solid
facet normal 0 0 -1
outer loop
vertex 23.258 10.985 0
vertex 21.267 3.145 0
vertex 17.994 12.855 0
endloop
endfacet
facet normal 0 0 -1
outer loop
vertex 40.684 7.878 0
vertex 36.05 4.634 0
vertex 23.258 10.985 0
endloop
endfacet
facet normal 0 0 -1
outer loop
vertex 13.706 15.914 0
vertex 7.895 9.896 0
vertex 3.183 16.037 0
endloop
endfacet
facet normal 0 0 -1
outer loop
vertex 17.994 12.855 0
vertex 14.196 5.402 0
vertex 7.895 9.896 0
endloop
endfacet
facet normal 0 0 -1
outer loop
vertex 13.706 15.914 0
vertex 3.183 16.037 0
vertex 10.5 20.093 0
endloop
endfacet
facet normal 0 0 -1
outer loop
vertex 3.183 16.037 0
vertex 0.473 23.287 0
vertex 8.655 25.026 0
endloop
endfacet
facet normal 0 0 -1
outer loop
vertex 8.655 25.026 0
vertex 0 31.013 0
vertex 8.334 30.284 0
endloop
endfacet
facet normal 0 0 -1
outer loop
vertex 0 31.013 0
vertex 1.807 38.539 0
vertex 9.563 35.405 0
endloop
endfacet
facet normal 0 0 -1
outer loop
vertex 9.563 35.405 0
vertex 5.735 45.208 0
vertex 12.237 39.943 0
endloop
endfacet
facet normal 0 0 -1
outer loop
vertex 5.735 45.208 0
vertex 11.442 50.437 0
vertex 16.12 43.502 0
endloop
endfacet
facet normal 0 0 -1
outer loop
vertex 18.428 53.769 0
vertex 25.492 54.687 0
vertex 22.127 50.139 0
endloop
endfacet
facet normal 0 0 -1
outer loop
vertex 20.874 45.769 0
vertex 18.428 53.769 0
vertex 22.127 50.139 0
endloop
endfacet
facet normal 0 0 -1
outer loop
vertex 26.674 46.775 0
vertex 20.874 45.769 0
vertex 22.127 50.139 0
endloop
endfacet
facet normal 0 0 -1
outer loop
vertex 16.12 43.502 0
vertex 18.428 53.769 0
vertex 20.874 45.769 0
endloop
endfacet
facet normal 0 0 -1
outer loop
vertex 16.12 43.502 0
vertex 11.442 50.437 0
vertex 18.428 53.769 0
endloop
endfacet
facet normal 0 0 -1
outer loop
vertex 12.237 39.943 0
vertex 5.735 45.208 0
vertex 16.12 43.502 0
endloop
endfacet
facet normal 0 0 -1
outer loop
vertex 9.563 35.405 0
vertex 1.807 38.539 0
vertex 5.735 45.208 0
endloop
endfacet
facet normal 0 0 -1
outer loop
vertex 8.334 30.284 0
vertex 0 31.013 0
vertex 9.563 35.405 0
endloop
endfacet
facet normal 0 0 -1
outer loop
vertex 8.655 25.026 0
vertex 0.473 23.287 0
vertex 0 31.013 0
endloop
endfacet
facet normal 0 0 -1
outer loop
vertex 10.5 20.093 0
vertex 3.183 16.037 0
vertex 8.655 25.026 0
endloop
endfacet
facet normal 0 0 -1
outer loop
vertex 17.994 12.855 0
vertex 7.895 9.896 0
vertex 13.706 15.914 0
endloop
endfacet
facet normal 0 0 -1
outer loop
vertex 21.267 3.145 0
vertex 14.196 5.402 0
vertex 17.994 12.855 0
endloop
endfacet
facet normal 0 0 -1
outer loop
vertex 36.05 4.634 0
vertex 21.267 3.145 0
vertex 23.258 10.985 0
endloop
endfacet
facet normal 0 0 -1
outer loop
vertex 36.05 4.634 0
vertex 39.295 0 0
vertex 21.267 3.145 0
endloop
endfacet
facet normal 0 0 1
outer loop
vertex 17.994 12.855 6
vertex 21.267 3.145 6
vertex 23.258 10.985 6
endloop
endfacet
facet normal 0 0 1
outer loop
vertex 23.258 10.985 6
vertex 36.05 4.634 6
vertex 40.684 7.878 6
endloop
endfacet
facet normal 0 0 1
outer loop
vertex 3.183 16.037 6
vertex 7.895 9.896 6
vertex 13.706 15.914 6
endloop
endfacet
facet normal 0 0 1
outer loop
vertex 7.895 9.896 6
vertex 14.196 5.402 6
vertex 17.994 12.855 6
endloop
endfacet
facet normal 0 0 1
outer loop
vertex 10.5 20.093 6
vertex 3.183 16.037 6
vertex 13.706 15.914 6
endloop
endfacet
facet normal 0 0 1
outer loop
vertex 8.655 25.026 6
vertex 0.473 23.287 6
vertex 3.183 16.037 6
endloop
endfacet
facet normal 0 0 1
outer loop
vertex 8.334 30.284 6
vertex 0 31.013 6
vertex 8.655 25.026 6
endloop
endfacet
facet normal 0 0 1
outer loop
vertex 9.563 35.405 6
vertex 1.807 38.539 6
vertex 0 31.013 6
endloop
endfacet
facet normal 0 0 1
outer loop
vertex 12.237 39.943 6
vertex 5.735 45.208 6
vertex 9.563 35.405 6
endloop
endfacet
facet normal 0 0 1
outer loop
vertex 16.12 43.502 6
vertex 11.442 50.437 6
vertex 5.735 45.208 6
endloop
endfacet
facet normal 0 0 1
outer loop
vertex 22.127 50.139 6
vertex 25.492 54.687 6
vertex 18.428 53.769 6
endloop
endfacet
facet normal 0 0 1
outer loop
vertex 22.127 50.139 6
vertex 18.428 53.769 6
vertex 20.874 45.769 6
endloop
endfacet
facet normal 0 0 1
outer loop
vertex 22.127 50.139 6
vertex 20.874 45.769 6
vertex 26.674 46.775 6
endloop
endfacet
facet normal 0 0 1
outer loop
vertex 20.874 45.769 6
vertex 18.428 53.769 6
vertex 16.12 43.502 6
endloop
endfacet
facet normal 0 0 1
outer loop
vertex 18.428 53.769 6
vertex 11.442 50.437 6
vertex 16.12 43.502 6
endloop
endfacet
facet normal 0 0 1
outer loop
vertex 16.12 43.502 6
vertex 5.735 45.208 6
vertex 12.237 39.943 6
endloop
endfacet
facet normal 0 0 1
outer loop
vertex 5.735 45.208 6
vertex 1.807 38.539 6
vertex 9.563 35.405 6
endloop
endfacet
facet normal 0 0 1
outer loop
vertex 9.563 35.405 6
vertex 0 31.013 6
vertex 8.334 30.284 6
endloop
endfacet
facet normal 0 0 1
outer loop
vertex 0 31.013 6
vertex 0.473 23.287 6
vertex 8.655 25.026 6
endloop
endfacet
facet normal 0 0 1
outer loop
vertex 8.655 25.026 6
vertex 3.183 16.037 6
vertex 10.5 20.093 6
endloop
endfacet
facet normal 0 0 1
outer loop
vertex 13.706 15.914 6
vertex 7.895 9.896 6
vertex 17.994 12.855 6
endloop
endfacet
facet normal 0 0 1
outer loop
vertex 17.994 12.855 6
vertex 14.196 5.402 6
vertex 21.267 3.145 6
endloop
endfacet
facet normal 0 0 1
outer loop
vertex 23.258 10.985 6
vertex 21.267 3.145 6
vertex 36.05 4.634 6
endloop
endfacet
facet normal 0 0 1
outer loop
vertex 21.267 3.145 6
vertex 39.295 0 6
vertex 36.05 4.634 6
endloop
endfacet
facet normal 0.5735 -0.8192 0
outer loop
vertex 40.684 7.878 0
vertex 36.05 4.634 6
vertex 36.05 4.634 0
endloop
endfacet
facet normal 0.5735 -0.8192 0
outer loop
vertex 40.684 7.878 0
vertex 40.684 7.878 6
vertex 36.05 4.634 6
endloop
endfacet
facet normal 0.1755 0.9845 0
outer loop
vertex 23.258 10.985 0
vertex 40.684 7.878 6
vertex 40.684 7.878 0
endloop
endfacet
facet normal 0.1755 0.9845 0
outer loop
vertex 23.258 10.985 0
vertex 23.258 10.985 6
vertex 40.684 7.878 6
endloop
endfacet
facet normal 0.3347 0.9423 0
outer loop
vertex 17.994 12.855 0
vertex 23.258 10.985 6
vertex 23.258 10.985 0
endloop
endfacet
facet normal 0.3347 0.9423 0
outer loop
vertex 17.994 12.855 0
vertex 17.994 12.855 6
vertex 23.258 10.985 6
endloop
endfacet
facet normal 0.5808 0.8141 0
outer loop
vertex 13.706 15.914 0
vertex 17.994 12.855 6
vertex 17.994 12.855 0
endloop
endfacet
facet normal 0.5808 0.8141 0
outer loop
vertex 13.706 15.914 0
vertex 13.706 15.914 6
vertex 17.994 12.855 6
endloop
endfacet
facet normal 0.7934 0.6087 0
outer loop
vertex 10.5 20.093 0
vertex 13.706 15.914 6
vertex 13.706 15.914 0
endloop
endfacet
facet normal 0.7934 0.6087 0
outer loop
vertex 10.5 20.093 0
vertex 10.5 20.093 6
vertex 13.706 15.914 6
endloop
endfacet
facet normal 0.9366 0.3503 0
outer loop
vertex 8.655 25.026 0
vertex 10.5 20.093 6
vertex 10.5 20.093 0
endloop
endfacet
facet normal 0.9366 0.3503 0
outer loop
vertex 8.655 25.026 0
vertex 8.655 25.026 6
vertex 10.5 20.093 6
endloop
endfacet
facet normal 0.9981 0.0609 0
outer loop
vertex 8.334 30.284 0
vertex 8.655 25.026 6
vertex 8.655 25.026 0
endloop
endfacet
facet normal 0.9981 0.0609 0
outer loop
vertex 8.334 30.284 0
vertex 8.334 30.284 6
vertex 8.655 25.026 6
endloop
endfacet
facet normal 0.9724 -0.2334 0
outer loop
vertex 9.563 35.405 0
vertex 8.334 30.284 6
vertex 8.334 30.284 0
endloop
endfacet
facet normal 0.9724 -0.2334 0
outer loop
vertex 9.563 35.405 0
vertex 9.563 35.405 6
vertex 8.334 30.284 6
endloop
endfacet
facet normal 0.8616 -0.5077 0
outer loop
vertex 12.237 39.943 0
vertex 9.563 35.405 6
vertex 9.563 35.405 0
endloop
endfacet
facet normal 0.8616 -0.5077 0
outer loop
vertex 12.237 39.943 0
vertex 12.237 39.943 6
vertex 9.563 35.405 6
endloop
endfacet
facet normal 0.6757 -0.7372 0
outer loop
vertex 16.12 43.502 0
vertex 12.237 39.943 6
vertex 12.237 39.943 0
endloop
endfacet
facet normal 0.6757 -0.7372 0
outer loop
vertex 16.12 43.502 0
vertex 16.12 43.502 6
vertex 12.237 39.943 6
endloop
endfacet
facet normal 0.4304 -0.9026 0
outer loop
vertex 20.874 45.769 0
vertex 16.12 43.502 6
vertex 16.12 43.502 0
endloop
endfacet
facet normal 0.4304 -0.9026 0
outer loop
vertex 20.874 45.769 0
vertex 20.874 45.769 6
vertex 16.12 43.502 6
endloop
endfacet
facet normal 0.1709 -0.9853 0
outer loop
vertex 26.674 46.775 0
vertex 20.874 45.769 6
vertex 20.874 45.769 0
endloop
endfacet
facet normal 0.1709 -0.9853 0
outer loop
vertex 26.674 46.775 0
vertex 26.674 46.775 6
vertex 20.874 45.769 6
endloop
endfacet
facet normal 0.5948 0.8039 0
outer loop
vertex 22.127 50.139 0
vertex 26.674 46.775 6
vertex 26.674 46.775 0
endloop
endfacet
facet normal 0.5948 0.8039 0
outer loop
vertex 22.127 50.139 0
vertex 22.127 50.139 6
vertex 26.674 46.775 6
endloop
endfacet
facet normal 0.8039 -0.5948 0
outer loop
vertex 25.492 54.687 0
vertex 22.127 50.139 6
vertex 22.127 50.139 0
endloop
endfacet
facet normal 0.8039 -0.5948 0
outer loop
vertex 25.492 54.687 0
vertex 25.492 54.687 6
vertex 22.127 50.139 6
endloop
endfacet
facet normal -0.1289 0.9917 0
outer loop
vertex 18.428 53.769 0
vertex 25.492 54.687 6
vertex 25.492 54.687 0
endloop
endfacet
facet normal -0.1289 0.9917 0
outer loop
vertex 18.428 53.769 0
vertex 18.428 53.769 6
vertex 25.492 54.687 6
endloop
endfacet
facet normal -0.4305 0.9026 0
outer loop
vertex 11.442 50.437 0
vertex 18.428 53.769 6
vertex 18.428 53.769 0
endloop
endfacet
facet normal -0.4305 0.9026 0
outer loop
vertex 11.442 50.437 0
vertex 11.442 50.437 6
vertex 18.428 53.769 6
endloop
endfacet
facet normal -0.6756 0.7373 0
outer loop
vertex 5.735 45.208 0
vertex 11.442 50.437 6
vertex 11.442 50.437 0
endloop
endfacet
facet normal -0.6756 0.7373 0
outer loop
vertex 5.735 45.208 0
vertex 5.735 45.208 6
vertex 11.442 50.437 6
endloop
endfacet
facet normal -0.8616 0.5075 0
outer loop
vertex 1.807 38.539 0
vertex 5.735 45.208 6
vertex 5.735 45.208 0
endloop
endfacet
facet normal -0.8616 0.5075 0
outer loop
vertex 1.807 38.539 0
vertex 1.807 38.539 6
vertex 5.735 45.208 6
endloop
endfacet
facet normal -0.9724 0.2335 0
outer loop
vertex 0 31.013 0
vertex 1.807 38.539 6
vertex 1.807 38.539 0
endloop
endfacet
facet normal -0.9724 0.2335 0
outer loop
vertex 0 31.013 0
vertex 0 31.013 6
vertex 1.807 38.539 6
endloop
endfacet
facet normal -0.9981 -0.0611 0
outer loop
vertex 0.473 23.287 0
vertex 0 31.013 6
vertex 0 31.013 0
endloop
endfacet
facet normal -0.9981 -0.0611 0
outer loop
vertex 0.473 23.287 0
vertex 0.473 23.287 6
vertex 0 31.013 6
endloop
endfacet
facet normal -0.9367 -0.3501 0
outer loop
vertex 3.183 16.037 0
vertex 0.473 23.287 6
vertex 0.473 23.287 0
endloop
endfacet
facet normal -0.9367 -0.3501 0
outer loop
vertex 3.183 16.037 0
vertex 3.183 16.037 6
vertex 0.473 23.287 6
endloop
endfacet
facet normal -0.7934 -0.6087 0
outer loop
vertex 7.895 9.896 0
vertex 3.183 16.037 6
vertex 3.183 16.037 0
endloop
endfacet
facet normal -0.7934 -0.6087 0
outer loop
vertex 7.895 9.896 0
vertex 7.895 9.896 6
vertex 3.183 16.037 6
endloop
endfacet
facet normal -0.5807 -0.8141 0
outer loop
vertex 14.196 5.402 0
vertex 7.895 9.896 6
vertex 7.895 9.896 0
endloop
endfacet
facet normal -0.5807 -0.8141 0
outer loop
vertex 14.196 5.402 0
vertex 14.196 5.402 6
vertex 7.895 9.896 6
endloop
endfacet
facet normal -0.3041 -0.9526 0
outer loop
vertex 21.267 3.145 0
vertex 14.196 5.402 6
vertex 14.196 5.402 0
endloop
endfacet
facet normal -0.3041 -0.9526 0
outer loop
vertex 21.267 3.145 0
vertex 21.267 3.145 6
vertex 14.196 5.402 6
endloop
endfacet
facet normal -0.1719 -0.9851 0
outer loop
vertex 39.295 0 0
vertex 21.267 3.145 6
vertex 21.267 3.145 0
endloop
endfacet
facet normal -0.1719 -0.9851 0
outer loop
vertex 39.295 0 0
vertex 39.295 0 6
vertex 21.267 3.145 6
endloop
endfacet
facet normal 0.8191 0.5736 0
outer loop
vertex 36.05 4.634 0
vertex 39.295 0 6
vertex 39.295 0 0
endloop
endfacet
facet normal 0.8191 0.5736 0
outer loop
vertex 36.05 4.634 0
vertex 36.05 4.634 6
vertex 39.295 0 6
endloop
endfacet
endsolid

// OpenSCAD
$fn = 32;

// ----------------------------------------------------------------------
// Hook plate: curl radius 22 mm over 170 degrees, 8 mm thick band
// ----------------------------------------------------------------------

// --- parameters (mm) ---
profile_height = 6;       // extrusion height
profile_points = 26;      // points of the closed outline

profile = [[22.127, 50.139], [25.492, 54.687], [18.428, 53.769], [11.442, 50.437], [5.735, 45.208], [1.807, 38.539], [0, 31.013], [0.473, 23.287], [3.183, 16.037], [7.895, 9.896], [14.196, 5.402], [21.267, 3.145], [39.295, 0], [36.05, 4.634], [40.684, 7.878], [23.258, 10.985], [17.994, 12.855], [13.706, 15.914], [10.5, 20.093], [8.655, 25.026], [8.334, 30.284], [9.563, 35.405], [12.237, 39.943], [16.12, 43.502], [20.874, 45.769], [26.674, 46.775]];  // single closed polygon, 26 points, counter clockwise

// --- the one profile operation ---
linear_extrude(height = profile_height) polygon(points = profile);
